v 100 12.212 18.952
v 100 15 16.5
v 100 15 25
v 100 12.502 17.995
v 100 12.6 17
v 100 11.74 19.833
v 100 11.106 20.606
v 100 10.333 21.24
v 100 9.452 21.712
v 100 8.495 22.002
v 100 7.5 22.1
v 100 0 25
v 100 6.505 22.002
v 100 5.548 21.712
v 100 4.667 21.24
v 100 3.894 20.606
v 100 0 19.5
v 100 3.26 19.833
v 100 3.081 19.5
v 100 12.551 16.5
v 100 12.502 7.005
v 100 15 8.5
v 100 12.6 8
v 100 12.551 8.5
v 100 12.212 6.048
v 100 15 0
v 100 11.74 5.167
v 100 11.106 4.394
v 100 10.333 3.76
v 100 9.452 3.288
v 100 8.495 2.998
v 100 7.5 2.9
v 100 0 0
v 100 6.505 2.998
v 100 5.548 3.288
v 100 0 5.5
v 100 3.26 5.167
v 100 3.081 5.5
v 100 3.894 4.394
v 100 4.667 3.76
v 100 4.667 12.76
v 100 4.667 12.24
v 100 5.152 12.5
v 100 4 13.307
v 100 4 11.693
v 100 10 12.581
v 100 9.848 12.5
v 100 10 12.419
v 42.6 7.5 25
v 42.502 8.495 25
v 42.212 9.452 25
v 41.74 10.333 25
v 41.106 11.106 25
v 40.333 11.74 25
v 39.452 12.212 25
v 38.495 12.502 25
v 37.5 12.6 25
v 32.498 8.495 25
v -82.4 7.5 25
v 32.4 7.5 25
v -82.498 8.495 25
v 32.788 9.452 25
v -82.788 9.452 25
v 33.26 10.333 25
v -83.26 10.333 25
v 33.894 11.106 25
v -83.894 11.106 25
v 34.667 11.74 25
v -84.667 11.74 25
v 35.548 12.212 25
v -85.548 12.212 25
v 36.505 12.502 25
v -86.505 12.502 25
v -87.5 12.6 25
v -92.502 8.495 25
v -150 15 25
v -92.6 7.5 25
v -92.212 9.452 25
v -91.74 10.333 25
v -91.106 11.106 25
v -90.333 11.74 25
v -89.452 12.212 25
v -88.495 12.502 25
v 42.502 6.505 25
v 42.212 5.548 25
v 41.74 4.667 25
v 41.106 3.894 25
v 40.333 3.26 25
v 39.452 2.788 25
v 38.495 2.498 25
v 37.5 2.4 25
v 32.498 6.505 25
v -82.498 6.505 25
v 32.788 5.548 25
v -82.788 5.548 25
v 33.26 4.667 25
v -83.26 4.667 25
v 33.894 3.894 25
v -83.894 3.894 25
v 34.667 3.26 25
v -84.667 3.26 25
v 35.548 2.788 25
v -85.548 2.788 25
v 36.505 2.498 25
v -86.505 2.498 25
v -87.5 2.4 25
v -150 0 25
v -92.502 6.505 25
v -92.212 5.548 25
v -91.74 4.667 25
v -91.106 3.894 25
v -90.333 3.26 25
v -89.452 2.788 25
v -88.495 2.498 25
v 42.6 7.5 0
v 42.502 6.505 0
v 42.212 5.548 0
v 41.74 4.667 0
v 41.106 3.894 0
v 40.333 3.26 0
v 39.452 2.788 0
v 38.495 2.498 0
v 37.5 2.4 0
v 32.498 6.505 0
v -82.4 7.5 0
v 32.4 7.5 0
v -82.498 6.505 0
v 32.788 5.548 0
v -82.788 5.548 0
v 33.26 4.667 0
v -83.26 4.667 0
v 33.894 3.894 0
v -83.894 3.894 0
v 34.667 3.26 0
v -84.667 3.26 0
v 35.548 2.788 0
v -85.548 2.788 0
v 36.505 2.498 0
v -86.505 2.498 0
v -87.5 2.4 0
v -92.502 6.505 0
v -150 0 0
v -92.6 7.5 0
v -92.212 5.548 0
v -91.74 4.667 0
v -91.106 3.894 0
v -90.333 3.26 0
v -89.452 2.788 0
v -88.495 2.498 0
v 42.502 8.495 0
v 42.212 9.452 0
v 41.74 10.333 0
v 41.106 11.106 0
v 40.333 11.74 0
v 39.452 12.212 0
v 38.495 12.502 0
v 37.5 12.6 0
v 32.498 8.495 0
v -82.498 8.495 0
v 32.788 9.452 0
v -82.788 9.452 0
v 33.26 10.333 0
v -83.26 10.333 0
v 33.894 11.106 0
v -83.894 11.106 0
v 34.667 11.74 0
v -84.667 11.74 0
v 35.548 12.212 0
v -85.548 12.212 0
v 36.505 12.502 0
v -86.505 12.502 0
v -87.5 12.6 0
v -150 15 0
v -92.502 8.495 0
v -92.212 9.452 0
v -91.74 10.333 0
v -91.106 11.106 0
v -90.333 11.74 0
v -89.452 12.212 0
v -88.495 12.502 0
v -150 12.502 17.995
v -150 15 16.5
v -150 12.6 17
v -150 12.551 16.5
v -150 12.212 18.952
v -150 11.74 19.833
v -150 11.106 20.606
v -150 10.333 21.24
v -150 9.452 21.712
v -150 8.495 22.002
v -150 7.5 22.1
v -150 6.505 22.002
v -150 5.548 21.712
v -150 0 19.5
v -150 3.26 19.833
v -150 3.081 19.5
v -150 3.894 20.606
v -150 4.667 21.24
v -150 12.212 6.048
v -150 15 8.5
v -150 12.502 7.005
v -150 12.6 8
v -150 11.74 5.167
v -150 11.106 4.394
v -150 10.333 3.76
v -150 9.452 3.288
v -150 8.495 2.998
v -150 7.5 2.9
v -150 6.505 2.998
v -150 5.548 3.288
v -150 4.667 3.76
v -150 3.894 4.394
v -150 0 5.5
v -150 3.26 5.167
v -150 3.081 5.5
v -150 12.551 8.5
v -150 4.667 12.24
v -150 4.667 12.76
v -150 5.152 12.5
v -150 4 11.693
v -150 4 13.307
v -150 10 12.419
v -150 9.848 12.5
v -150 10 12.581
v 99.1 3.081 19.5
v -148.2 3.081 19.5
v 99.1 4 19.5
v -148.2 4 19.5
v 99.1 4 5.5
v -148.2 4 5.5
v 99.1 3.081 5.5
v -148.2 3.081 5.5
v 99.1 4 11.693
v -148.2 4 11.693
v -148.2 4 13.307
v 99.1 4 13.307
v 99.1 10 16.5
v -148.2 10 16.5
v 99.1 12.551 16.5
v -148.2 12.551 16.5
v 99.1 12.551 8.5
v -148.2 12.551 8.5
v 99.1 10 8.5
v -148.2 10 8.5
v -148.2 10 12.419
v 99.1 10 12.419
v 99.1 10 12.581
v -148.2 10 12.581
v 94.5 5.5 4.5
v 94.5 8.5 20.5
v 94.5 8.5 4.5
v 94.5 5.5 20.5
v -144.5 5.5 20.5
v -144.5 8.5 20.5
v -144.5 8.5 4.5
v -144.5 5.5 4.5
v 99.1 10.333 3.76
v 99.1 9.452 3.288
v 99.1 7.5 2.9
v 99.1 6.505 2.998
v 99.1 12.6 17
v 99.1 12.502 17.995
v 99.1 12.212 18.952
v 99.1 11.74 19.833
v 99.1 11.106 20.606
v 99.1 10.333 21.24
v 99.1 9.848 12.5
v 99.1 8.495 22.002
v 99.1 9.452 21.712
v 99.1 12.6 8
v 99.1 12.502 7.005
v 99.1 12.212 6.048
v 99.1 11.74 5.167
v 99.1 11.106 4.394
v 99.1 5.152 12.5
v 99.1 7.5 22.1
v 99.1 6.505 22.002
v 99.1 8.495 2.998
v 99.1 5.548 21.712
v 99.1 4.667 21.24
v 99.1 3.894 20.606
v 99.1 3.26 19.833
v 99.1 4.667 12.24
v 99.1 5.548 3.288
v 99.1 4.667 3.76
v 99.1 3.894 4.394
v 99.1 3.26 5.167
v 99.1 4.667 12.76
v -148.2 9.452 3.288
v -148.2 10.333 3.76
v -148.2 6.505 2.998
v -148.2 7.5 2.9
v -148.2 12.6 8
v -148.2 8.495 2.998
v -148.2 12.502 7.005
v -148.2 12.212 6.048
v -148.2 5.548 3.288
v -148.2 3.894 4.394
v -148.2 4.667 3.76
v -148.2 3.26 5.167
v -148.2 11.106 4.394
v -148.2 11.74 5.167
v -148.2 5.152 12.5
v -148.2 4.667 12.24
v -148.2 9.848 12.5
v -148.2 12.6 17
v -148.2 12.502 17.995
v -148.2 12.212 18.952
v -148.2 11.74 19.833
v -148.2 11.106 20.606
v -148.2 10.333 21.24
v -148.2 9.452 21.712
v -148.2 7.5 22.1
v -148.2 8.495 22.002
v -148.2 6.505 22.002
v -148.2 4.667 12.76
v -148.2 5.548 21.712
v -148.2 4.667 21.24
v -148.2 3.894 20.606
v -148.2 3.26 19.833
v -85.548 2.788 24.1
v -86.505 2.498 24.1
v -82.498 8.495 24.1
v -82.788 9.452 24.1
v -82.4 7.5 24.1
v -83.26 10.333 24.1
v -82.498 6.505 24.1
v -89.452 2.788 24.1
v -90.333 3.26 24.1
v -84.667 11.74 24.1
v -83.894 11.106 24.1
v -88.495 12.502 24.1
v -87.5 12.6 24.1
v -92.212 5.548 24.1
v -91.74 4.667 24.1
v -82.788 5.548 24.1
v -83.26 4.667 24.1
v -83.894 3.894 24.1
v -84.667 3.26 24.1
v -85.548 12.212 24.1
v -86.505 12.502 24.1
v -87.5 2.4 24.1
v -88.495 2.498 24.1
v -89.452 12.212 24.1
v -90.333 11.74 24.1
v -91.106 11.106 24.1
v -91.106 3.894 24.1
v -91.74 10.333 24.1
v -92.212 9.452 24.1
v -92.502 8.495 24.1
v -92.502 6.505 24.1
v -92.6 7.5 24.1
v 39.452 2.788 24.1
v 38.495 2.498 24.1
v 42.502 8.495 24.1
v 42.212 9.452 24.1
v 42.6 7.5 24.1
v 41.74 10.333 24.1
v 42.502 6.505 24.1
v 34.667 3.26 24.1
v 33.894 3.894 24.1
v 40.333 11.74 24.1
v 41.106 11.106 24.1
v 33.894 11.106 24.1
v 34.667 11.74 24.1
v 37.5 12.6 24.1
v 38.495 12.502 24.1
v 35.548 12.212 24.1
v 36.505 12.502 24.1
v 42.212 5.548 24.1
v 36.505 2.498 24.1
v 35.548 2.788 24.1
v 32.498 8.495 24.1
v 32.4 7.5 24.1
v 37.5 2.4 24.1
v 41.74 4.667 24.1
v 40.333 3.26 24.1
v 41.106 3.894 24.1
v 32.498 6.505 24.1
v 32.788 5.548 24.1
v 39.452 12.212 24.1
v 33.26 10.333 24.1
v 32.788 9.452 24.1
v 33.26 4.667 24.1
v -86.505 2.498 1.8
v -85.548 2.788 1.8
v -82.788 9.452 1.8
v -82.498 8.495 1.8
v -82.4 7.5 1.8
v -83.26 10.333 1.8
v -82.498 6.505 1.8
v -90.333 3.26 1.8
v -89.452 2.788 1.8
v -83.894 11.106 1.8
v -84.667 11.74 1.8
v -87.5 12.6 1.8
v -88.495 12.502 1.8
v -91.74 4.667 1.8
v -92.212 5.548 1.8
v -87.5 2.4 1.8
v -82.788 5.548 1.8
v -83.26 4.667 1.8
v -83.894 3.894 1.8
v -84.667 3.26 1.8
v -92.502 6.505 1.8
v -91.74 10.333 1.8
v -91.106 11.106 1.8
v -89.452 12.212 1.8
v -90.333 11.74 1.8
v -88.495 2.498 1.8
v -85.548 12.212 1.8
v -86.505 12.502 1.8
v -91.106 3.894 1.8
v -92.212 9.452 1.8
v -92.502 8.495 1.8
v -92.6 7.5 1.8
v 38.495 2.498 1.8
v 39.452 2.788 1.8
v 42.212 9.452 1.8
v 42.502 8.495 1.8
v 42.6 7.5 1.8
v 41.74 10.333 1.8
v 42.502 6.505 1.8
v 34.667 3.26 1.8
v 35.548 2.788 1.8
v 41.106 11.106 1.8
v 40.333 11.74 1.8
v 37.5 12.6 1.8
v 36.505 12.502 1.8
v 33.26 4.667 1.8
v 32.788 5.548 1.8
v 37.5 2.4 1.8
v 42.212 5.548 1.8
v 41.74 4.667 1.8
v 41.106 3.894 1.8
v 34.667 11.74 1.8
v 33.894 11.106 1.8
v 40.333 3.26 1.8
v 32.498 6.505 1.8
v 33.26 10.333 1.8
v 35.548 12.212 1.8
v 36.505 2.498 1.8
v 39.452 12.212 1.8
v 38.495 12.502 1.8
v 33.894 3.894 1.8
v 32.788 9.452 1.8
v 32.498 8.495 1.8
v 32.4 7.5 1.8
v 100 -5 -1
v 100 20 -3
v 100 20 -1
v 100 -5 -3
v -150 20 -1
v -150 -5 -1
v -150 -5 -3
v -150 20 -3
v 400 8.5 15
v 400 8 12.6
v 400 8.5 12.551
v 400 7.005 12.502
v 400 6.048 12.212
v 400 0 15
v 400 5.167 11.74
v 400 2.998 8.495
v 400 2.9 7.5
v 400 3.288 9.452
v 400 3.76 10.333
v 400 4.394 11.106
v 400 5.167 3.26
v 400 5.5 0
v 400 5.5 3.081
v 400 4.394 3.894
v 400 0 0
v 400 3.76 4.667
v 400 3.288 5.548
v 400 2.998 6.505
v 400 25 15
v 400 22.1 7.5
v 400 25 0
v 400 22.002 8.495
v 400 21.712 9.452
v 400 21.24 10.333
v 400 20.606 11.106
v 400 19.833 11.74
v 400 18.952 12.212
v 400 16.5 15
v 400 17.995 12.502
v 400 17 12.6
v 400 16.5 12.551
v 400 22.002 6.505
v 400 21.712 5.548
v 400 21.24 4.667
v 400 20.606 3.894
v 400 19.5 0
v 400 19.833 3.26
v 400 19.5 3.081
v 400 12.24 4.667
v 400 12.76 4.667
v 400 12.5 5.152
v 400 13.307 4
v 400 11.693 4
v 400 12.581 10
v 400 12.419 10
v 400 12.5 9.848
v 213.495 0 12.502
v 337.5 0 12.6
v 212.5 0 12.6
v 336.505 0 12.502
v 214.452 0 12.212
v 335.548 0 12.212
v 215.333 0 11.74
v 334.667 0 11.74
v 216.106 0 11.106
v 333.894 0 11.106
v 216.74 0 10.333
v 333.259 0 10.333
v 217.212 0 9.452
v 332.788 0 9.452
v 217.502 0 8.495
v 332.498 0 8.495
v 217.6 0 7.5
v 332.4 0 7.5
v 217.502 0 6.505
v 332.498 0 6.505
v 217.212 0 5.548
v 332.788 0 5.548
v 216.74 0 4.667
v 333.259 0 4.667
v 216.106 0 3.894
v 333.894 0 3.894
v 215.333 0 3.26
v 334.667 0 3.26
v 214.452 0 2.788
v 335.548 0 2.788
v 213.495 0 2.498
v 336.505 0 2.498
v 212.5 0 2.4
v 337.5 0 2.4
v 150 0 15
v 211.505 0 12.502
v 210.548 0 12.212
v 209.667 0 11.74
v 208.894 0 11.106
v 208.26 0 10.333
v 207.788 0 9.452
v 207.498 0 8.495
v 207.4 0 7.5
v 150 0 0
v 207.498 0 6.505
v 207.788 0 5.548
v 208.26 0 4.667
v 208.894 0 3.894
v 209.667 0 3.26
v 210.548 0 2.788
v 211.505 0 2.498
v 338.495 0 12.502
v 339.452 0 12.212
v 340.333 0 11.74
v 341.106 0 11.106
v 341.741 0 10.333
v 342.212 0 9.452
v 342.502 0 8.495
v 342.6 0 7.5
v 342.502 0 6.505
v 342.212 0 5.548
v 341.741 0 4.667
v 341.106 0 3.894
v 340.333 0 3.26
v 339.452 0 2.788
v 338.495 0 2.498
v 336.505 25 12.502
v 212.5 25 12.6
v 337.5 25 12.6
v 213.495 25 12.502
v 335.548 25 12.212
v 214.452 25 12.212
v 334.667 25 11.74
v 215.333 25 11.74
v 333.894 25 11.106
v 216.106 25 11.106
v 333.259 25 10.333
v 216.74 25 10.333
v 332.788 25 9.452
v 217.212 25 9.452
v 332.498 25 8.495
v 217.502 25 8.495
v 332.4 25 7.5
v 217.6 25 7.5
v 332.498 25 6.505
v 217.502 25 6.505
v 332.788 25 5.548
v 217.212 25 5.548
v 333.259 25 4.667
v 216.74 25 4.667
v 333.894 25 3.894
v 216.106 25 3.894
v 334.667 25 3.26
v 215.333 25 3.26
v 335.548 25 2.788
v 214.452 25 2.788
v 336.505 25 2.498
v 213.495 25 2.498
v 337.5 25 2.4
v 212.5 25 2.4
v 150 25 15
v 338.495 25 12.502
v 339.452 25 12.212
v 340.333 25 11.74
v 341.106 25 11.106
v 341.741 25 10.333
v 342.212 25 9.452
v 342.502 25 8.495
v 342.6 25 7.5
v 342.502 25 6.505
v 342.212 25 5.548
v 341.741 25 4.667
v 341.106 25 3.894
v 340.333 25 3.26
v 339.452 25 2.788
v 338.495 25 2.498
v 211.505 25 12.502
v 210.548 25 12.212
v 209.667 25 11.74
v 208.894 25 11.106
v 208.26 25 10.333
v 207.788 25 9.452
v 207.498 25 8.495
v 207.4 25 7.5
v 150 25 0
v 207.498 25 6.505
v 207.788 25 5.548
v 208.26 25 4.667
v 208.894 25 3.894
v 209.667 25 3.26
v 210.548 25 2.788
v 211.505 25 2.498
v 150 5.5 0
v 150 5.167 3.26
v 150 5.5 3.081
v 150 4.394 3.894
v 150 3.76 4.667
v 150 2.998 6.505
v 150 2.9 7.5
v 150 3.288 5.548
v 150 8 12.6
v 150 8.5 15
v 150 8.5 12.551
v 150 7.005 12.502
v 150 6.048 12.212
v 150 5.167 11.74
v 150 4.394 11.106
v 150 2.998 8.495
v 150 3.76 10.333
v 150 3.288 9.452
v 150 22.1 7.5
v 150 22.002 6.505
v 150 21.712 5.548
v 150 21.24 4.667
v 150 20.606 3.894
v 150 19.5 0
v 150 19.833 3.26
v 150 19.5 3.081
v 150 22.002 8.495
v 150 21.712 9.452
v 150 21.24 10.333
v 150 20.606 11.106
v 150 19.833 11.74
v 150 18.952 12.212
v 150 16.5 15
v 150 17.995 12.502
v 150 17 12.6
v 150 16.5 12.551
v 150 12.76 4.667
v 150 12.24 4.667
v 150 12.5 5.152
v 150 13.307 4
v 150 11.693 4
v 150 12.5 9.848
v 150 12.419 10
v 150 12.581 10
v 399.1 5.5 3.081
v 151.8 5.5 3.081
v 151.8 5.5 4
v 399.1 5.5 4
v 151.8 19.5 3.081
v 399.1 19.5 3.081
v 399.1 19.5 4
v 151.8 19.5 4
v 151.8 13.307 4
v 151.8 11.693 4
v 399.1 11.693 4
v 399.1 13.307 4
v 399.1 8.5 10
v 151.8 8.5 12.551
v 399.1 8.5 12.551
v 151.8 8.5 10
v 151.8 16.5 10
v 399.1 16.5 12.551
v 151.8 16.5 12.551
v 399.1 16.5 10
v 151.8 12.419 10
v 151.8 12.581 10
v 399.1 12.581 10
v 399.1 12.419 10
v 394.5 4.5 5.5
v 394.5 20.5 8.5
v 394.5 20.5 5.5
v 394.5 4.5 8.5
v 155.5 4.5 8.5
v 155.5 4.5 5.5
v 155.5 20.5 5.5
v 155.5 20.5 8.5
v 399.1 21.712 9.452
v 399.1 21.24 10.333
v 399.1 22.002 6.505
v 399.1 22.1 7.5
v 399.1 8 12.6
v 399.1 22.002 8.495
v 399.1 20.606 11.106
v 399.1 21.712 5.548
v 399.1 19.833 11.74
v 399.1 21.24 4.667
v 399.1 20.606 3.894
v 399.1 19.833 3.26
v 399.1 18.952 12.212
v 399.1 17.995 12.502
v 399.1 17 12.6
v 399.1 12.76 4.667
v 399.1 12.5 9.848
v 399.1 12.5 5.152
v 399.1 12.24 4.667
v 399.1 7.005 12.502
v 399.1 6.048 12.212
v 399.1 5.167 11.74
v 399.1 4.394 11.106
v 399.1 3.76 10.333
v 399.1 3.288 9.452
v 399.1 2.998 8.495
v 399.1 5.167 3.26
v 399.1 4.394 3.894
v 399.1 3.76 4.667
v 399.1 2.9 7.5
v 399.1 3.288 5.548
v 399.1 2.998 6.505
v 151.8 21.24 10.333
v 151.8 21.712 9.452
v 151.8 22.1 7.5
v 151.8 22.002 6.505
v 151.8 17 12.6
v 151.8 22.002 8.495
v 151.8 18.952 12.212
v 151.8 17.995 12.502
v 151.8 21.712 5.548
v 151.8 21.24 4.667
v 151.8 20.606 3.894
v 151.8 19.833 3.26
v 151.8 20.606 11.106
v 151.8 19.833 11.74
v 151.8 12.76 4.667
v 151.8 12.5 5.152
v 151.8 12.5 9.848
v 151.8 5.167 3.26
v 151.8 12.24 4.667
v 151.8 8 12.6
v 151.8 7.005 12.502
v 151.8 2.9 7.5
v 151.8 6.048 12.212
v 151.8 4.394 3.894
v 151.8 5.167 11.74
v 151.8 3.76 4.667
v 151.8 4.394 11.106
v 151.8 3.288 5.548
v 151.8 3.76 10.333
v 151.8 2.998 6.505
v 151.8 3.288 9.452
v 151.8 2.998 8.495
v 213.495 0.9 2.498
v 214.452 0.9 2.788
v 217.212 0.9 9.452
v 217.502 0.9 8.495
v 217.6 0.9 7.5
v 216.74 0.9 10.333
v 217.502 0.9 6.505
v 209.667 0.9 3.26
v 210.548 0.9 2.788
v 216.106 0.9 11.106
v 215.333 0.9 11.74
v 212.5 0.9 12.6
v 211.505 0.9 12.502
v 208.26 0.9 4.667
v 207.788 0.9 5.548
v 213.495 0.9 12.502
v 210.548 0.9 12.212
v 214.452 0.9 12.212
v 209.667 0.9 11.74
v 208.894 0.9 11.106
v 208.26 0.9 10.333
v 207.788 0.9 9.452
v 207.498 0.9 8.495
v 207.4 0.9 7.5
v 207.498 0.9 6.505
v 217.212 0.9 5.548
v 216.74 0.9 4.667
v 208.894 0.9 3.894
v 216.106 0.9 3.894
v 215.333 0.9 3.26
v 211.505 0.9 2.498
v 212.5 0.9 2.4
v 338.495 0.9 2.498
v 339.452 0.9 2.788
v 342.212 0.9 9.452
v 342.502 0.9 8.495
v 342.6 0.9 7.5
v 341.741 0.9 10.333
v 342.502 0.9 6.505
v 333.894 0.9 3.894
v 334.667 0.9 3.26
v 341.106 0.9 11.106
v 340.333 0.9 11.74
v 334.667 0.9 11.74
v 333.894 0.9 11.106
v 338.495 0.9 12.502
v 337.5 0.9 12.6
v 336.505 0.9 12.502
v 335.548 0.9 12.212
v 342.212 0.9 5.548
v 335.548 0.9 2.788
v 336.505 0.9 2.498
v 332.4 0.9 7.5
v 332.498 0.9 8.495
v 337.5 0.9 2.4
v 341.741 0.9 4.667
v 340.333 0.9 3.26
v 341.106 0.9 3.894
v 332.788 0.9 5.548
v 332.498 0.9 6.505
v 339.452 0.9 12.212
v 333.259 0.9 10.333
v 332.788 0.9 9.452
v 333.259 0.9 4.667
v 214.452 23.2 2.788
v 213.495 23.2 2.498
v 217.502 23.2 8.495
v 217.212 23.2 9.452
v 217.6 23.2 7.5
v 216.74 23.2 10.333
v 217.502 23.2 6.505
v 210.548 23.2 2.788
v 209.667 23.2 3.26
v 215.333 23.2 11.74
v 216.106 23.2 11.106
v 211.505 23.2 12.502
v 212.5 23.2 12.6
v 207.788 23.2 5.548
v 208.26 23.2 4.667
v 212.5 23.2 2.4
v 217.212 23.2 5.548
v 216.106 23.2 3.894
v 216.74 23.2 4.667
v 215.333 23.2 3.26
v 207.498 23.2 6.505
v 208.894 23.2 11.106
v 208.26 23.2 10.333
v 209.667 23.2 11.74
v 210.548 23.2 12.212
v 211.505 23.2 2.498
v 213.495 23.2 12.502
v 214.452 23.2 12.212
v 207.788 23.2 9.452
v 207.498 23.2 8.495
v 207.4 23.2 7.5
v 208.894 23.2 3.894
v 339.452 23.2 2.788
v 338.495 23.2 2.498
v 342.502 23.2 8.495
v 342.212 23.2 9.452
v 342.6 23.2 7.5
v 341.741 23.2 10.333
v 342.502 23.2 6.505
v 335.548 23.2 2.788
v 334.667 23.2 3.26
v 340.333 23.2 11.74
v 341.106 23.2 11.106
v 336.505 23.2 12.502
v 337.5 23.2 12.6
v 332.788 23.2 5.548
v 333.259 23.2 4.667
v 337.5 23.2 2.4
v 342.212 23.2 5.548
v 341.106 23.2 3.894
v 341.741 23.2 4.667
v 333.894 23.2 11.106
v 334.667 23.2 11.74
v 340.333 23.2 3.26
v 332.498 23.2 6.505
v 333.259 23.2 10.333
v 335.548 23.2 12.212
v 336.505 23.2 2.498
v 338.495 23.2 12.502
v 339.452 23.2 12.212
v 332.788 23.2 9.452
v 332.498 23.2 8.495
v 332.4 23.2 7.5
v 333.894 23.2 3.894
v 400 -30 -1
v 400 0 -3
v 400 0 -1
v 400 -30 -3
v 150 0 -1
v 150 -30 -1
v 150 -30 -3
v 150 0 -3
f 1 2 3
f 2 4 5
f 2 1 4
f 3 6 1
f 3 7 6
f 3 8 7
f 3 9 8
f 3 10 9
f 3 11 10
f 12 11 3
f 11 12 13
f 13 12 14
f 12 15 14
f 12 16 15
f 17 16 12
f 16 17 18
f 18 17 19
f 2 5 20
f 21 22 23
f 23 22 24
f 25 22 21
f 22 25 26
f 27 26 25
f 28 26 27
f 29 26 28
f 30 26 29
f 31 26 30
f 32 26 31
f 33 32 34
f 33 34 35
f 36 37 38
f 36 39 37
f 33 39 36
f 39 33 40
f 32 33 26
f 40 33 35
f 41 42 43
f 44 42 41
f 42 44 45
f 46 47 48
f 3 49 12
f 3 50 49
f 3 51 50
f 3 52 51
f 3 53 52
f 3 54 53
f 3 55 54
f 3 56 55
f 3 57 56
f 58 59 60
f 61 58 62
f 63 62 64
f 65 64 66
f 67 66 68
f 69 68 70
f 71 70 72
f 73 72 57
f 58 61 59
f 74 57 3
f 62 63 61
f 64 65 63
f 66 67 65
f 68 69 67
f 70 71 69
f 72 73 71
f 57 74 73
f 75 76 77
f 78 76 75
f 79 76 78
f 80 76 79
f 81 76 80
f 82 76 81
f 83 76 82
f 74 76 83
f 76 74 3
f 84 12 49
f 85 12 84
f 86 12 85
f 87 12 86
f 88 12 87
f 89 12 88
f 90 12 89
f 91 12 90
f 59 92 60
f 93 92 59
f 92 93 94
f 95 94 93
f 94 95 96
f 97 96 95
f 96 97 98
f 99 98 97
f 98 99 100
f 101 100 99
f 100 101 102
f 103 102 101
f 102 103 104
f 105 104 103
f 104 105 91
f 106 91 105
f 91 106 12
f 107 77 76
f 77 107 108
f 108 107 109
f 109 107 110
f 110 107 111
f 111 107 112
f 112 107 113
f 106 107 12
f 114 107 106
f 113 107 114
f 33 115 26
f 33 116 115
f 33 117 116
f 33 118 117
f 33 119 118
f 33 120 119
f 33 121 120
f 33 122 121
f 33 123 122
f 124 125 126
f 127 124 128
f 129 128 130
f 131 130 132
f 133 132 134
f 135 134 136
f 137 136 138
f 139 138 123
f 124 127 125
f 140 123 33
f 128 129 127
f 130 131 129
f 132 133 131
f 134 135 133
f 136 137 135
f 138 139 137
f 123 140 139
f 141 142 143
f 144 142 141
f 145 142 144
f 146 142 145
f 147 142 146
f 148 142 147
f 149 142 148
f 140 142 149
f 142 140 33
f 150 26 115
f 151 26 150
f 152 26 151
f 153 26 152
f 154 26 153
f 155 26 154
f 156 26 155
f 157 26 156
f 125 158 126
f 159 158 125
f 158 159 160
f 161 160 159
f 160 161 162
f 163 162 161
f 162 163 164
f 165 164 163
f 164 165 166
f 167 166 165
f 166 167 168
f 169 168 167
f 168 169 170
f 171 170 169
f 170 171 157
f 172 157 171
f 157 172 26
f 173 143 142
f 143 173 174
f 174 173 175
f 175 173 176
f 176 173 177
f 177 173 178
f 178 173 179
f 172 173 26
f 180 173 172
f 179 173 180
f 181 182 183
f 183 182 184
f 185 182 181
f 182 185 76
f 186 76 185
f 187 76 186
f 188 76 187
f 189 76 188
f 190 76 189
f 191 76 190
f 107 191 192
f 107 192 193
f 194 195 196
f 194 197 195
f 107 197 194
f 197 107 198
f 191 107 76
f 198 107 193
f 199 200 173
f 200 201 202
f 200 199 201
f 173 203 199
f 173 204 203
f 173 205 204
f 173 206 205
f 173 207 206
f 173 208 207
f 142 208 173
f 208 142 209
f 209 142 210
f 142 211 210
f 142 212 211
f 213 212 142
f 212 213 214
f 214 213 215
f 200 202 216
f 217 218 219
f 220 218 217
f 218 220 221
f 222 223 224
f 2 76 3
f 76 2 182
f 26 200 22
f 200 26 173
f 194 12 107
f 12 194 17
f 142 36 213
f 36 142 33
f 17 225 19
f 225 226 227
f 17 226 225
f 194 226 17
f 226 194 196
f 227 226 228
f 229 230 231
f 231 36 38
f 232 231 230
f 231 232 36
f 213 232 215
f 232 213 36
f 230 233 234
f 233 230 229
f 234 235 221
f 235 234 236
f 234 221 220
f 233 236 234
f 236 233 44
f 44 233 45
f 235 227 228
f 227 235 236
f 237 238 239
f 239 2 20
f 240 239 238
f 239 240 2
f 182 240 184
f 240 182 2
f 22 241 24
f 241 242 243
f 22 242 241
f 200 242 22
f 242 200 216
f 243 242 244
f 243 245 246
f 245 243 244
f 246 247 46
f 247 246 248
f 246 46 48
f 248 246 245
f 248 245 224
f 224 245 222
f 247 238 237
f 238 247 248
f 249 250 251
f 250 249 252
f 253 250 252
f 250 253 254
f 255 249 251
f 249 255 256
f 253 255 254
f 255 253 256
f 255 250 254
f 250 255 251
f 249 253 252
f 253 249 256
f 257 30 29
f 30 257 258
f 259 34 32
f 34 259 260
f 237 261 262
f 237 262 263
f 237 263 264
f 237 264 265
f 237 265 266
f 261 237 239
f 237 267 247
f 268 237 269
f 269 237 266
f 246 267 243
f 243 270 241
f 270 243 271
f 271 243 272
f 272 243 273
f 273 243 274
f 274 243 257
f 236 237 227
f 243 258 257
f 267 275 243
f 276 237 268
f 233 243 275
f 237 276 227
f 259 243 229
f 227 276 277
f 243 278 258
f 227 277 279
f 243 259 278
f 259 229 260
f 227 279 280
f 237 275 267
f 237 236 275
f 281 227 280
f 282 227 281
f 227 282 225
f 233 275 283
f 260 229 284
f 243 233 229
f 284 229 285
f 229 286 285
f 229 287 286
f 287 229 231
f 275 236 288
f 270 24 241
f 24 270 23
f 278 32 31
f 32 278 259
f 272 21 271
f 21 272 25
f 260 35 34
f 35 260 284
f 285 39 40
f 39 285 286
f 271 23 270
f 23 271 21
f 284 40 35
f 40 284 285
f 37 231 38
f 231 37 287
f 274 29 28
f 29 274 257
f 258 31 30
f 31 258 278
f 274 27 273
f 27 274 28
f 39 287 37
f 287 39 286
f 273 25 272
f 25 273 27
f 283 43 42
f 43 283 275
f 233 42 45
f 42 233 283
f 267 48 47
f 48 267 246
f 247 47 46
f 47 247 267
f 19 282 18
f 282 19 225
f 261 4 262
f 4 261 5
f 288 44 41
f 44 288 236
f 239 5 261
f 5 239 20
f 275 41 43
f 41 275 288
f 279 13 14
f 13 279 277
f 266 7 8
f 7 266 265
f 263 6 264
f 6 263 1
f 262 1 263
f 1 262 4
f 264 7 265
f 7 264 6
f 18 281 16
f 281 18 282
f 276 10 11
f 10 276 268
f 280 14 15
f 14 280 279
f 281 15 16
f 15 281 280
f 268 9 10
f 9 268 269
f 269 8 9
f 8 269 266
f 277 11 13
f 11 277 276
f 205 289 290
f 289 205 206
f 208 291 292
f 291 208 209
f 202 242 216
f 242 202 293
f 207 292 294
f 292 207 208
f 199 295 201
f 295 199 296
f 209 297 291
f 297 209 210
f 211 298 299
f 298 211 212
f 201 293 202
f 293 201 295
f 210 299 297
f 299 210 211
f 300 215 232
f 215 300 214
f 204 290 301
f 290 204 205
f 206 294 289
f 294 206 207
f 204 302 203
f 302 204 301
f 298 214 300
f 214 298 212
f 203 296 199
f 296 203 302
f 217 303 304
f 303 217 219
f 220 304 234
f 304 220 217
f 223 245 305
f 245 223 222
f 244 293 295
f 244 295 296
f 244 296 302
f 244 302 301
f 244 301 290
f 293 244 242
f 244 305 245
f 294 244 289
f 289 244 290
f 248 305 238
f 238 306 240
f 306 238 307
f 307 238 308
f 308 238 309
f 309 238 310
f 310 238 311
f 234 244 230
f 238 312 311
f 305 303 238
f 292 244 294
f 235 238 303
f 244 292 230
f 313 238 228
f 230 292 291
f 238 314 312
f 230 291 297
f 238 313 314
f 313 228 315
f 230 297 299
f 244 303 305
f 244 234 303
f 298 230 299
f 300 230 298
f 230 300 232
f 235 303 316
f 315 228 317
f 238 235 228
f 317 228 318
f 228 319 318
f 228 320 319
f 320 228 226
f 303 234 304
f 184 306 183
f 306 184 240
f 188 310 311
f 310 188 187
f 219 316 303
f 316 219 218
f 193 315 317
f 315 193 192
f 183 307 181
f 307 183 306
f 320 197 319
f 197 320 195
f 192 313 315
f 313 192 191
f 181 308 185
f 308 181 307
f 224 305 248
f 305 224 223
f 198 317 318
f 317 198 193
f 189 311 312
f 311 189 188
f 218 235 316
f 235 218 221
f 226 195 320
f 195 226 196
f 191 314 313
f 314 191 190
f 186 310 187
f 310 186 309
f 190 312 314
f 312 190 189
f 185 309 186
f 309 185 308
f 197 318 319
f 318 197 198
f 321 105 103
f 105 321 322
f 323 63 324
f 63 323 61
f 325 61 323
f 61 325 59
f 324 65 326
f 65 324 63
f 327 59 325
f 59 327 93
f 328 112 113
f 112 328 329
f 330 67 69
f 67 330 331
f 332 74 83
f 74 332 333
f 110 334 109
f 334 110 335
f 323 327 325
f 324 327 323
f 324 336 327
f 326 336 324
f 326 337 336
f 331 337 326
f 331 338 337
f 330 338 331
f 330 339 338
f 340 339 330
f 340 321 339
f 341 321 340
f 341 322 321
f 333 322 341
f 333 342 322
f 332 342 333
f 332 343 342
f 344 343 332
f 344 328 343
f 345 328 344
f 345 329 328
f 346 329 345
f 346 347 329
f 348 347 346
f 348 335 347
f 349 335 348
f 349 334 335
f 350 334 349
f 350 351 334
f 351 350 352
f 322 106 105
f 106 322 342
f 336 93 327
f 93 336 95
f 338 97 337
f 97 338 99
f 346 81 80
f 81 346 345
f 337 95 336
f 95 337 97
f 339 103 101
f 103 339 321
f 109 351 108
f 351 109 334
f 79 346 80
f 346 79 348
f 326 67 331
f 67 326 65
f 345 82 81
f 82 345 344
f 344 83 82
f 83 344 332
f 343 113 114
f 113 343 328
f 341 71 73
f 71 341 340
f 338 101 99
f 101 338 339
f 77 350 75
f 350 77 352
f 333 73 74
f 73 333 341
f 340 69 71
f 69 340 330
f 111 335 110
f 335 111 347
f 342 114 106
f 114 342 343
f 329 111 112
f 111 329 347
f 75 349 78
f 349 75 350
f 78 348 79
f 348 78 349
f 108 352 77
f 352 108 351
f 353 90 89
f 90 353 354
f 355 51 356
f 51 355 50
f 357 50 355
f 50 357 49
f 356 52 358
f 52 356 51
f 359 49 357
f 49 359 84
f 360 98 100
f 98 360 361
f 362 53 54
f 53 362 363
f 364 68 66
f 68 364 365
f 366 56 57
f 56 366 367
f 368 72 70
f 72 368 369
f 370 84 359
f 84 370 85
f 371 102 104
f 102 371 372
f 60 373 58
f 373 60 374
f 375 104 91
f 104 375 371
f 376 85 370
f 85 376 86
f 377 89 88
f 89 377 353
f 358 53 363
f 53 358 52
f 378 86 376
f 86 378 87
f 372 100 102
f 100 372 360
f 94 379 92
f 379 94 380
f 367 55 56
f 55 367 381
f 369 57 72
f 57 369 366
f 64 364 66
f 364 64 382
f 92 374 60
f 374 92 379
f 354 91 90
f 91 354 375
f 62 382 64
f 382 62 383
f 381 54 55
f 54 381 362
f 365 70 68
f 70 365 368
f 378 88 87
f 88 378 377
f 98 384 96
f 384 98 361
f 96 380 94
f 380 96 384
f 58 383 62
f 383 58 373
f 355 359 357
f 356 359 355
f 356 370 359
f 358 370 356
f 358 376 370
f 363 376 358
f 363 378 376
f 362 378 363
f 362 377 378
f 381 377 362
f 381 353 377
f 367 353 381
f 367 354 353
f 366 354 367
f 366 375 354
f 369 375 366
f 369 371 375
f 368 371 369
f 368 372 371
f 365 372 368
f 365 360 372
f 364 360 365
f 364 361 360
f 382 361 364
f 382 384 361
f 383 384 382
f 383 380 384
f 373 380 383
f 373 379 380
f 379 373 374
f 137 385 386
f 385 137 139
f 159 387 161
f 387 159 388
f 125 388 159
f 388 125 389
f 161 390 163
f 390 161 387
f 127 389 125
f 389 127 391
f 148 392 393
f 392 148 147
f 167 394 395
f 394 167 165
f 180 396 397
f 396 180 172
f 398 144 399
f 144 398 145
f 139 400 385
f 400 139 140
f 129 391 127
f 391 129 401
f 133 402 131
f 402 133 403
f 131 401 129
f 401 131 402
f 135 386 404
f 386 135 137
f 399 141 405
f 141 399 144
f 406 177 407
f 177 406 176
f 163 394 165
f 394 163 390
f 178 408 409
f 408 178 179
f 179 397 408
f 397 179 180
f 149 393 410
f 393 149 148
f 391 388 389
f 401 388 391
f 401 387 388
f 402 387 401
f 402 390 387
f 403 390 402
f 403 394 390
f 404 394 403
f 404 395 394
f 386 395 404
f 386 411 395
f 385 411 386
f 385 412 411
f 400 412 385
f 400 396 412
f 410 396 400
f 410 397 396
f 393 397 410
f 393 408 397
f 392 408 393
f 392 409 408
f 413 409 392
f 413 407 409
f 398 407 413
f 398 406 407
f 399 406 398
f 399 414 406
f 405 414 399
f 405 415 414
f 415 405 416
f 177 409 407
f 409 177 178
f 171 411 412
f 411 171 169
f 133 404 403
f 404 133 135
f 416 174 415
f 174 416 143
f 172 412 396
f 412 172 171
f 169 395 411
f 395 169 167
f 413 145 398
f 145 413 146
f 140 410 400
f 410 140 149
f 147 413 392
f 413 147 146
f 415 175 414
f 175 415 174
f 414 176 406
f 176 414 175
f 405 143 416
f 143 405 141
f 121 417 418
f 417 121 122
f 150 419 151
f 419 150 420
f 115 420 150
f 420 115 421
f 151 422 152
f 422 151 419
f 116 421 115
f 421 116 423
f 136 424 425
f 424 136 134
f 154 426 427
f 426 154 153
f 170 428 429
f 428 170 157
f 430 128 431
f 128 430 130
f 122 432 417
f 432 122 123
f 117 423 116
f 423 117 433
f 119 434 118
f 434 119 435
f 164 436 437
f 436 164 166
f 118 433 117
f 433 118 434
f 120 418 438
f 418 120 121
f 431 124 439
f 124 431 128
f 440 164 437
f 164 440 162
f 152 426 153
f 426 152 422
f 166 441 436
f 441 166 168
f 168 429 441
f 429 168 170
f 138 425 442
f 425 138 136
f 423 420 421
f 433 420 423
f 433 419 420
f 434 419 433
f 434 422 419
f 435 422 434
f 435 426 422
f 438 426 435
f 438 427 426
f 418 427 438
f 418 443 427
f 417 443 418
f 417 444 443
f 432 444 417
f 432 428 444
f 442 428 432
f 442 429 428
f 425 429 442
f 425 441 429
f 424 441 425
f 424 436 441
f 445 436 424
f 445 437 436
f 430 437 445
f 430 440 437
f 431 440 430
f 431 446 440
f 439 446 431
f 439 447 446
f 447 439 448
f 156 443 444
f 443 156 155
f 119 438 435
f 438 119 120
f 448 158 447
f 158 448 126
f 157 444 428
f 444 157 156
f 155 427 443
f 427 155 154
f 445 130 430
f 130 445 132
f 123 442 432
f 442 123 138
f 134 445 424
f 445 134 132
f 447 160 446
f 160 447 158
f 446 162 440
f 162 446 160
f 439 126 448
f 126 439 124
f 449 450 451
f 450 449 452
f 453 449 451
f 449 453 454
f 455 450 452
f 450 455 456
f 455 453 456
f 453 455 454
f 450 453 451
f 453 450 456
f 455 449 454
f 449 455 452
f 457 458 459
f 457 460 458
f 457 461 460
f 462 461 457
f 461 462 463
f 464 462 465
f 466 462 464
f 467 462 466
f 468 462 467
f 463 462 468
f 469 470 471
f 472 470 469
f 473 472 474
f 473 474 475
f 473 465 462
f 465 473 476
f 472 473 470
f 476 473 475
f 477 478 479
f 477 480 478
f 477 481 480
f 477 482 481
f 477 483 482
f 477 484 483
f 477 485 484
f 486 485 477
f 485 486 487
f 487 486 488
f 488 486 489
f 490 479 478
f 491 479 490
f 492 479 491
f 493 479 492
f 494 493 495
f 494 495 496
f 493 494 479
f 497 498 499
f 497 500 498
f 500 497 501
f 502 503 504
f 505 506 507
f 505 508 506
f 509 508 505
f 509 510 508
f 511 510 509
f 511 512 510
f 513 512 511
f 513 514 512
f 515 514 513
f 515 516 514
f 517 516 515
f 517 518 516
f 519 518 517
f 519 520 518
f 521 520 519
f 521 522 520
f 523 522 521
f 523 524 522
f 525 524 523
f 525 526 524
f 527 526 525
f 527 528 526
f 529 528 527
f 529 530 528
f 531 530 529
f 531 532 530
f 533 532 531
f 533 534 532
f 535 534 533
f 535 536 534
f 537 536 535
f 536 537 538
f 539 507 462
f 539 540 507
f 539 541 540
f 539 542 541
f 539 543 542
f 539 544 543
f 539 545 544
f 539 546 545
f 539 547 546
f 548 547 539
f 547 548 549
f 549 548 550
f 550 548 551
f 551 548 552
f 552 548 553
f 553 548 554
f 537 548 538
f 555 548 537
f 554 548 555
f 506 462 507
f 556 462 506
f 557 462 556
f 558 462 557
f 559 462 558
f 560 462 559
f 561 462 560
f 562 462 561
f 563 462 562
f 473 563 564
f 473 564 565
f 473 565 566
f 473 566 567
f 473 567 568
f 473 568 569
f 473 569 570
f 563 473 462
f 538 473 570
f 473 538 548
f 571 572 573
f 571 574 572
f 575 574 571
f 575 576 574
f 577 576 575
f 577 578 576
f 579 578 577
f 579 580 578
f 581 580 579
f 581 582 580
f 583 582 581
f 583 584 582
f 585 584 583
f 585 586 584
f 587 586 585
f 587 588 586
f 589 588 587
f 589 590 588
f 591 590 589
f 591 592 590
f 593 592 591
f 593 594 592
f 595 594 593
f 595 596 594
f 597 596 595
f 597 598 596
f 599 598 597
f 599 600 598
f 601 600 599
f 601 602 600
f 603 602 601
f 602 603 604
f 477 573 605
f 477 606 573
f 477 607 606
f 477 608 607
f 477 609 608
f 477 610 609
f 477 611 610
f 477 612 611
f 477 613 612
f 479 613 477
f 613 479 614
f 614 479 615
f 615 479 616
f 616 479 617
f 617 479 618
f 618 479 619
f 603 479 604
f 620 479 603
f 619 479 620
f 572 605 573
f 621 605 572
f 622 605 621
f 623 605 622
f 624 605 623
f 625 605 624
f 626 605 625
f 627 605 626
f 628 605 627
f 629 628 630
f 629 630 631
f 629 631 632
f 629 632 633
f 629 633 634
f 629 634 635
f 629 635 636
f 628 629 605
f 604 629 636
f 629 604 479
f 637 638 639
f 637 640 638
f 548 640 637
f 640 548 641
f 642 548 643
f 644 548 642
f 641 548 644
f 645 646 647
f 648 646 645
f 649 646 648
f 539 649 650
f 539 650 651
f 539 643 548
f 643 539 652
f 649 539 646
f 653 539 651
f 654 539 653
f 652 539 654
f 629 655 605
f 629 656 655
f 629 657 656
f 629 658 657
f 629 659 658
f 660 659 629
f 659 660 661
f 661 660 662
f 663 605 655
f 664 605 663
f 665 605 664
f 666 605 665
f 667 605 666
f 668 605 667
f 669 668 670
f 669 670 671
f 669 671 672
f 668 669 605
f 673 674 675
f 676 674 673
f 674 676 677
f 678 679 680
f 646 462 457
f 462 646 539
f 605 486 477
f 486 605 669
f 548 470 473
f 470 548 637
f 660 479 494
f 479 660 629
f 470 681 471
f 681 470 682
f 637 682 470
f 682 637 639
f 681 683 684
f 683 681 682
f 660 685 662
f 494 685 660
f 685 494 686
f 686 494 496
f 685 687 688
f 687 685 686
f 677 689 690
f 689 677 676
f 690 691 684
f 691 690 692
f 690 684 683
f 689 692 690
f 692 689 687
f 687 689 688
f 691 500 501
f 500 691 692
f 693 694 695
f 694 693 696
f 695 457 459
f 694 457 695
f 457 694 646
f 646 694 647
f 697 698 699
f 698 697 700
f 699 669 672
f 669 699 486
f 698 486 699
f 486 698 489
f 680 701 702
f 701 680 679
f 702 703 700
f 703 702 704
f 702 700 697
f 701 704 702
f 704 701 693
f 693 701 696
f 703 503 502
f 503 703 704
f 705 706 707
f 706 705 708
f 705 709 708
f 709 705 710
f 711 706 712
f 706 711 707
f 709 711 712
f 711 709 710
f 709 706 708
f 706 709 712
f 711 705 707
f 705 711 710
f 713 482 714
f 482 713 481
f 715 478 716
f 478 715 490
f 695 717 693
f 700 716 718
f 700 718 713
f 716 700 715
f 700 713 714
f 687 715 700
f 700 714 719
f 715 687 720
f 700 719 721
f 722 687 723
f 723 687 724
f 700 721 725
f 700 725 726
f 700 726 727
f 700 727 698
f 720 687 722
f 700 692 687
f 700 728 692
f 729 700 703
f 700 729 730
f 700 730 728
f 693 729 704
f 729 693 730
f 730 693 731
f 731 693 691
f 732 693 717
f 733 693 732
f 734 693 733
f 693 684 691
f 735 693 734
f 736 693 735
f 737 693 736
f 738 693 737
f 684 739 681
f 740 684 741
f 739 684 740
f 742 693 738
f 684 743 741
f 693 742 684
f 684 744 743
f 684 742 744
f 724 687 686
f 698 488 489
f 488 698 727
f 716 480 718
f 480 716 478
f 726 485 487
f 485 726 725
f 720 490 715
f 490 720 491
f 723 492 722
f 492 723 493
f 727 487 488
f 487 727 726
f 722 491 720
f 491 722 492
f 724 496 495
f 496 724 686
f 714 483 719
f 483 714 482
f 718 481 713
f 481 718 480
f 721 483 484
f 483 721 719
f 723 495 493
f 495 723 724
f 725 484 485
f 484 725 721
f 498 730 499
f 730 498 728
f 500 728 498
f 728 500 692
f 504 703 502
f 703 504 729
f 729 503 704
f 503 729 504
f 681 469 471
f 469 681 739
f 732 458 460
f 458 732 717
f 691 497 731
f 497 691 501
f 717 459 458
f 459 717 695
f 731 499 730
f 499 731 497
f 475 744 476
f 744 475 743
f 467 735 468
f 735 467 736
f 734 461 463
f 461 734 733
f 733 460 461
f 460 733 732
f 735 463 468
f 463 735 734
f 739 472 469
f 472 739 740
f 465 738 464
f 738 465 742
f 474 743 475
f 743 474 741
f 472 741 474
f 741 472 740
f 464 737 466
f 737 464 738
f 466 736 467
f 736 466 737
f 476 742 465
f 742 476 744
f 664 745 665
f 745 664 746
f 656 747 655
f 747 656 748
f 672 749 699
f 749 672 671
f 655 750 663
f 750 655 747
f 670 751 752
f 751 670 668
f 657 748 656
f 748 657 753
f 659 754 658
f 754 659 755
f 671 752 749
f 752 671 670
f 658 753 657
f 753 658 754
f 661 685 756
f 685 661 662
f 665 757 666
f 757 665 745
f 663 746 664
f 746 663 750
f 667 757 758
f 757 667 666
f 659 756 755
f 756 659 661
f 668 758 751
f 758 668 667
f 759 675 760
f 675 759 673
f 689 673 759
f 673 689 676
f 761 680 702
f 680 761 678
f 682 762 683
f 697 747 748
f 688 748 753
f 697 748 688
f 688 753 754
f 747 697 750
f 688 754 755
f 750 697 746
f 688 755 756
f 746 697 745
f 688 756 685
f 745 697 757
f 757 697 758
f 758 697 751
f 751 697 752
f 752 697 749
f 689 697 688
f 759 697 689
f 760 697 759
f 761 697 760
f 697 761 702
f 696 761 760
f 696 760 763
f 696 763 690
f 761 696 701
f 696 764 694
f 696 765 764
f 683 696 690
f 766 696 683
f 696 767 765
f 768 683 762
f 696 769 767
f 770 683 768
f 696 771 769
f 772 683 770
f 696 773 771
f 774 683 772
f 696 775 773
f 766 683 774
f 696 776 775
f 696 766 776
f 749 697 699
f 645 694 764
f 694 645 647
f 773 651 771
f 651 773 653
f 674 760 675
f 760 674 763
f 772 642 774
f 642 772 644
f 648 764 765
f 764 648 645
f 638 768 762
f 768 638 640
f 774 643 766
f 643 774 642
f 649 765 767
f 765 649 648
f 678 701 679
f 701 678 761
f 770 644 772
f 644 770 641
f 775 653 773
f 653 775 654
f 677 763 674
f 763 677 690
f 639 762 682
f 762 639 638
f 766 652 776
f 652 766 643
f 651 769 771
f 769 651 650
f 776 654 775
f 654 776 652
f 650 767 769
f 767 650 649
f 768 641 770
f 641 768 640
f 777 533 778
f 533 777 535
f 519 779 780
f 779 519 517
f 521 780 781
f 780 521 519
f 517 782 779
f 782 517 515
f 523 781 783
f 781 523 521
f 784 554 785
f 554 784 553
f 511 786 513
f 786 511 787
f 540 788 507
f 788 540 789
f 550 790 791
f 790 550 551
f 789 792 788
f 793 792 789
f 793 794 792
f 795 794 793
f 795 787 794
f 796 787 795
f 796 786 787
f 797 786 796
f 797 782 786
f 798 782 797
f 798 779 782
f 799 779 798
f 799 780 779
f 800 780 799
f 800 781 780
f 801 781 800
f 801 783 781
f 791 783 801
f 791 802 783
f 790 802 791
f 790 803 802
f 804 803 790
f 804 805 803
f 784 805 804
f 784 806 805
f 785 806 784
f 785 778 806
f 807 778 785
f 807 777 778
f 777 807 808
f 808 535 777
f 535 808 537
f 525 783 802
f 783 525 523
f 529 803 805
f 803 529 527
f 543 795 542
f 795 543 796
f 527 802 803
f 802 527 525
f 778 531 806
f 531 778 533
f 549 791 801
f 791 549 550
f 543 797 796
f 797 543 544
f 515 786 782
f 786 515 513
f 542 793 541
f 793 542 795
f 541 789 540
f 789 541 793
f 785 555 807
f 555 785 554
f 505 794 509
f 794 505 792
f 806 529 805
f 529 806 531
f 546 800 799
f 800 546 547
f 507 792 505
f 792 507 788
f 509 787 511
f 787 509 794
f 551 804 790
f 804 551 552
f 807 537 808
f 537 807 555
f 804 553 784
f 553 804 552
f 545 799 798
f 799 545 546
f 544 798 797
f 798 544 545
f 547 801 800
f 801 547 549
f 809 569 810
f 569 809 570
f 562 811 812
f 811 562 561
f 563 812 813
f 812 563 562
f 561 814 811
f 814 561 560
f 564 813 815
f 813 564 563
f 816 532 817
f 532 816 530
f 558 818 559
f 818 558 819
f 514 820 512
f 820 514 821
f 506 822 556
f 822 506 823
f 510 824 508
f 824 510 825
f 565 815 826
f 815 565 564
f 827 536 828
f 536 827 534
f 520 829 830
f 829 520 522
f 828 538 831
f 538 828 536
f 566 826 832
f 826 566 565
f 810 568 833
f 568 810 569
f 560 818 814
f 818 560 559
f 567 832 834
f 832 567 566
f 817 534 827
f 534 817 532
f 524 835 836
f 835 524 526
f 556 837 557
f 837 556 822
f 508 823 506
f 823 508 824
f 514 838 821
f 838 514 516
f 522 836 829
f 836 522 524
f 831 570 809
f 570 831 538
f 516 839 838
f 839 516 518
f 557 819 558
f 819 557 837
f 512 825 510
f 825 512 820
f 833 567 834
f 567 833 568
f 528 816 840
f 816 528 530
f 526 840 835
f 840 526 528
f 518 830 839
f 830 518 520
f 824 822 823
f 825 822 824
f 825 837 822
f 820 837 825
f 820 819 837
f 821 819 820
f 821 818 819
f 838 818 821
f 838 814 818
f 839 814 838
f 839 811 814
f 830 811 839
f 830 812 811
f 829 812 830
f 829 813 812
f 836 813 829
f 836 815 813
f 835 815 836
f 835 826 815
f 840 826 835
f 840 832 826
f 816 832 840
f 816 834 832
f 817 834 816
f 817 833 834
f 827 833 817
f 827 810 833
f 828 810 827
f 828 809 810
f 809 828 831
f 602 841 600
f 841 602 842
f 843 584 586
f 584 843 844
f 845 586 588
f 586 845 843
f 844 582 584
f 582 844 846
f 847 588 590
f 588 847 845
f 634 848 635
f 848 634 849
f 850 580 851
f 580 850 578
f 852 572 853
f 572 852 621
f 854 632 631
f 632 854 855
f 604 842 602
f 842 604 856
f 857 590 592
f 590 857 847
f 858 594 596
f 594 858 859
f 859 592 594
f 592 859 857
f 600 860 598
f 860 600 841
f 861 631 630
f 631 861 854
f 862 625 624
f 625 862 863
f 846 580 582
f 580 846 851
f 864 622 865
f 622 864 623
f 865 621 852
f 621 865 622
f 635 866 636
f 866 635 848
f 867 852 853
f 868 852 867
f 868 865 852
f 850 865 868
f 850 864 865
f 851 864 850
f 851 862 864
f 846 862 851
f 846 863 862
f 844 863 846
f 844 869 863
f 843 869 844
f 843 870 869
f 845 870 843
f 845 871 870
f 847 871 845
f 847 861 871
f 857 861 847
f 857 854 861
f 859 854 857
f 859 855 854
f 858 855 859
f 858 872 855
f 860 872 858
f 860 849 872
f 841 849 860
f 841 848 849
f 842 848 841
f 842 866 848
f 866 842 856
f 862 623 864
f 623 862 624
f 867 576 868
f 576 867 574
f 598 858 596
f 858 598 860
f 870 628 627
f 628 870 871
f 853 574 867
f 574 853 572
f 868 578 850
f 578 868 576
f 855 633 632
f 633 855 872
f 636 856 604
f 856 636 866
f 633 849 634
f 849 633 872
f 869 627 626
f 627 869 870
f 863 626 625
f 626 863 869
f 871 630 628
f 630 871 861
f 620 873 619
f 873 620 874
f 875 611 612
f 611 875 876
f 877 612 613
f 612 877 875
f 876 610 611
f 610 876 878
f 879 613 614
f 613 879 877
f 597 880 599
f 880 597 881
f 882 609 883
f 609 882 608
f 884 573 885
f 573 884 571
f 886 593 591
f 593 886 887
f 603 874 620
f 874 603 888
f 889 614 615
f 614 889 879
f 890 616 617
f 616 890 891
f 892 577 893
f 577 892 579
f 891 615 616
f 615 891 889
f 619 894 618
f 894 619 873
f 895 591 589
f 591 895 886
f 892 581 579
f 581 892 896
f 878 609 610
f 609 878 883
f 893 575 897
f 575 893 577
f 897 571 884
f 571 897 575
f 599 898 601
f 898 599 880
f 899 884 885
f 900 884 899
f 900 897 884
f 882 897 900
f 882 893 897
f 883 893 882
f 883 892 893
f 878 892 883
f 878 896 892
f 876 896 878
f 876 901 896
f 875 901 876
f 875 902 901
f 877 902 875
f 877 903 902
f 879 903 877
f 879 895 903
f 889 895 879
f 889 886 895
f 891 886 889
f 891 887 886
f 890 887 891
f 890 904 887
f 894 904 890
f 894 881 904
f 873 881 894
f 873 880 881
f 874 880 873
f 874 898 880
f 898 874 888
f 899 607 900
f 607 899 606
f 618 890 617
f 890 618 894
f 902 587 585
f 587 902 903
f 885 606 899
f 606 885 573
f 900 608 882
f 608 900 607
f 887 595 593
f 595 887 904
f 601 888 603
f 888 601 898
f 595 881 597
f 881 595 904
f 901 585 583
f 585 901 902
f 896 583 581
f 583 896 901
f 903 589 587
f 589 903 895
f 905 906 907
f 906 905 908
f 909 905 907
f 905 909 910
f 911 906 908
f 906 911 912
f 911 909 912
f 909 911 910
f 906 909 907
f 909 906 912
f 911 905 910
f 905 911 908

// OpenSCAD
// file: single_module.scad
/*
 * Single LED Strip Module - Minimal Design
 * Compact holder for one section of WS2812B LED strip
 *
 * Features:
 * - Minimal size - just enough to hold the strip
 * - 4 magnet holes for modular connections
 * - Lightweight and movable
 */

// ========== CONFIGURATION ==========

// LED Strip dimensions
strip_segment_length = 250;  // Length of this module
strip_width = 12;            // WS2812B strip width

// Module dimensions (MINIMIZED)
module_width = strip_segment_length;
module_height = 25;          // 2.5cm vertical spacing (compact!)
module_depth = 15;           // Reduced from 20mm to 15mm
wall_thickness = 1.5;        // Reduced from 2mm to 1.5mm

// LED channel (on front)
led_channel_depth = 4;       // Shallow groove (reduced from 5mm)
led_channel_width = 14;      // Increased to 14mm for better fit

// Wire channel (on back)
wire_channel_width = 8;      // Narrow channel for wires
wire_channel_depth = 5;      // Back routing space

// Magnets (user's magnets: 10mm dia × 1.54mm thick)
magnet_dia = 10.2;           // 10mm + 0.2mm tolerance
magnet_thickness = 1.8;      // 1.54mm + tolerance (thin!)
magnet_inset = 8;            // Distance from edges (adjusted for 25mm height)

// ========== SINGLE MODULE ==========

module minimal_strip_holder() {
    difference() {
        // Main body - thin shell
        cube([module_width, module_depth, module_height]);

        // Front LED channel (OPEN ENDS - strip passes through)
        translate([-0.1, -0.1, module_height/2 - led_channel_width/2])
            cube([module_width + 0.2,  // Goes all the way through left to right
                  led_channel_depth + 0.1,
                  led_channel_width]);

        // Back wire channel (OPEN ENDS - wires pass through)
        translate([-0.1, module_depth - wire_channel_depth, module_height/2 - wire_channel_width/2])
            cube([module_width + 0.2,  // Goes all the way through left to right
                  wire_channel_depth + 0.1,
                  wire_channel_width]);

        // Center cavity (weight reduction)
        translate([wall_thickness + 4,
                  led_channel_depth + wall_thickness,
                  wall_thickness + 3])
            cube([module_width - 2*wall_thickness - 8,
                  module_depth - led_channel_depth - wire_channel_depth - 2*wall_thickness,
                  module_height - 2*wall_thickness - 6]);

        // HORIZONTAL magnets (left/right)
        // Right side
        translate([module_width - magnet_thickness/2, module_depth/2, magnet_inset])
            rotate([0, 90, 0])
            cylinder(h=magnet_thickness + 0.1, d=magnet_dia, $fn=32);
        translate([module_width - magnet_thickness/2, module_depth/2, module_height - magnet_inset])
            rotate([0, 90, 0])
            cylinder(h=magnet_thickness + 0.1, d=magnet_dia, $fn=32);

        // Left side
        translate([-0.1, module_depth/2, magnet_inset])
            rotate([0, 90, 0])
            cylinder(h=magnet_thickness + 0.1, d=magnet_dia, $fn=32);
        translate([-0.1, module_depth/2, module_height - magnet_inset])
            rotate([0, 90, 0])
            cylinder(h=magnet_thickness + 0.1, d=magnet_dia, $fn=32);

        // VERTICAL magnets (top/bottom)
        // Top
        translate([module_width/4, module_depth/2, module_height - magnet_thickness/2])
            cylinder(h=magnet_thickness + 0.1, d=magnet_dia, $fn=32);
        translate([3*module_width/4, module_depth/2, module_height - magnet_thickness/2])
            cylinder(h=magnet_thickness + 0.1, d=magnet_dia, $fn=32);

        // Bottom
        translate([module_width/4, module_depth/2, -0.1])
            cylinder(h=magnet_thickness + 0.1, d=magnet_dia, $fn=32);
        translate([3*module_width/4, module_depth/2, -0.1])
            cylinder(h=magnet_thickness + 0.1, d=magnet_dia, $fn=32);
    }
}

// LED strip visualization (optional)
module led_strip_visual() {
    color("white", 0.9)
    translate([wall_thickness, led_channel_depth - 3, module_height/2 - strip_width/2])
    rotate([90, 0, 0])
    cube([module_width - 2*wall_thickness, strip_width, 3]);

    // LEDs
    led_spacing = module_width / 36;  // 36 LEDs per module
    for (i = [0:35]) {
        color("gold", 0.8)
        translate([i * led_spacing + led_spacing/2,
                  1,
                  module_height/2])
            rotate([90, 0, 0])
            cylinder(h=2, d=4, $fn=6);
    }
}

// ========== RENDER ==========

// Show module
minimal_strip_holder();

// Show LED strip (uncomment to visualize)
// led_strip_visual();

// ========== EXPORT NOTES ==========
/*
 * DIMENSIONS:
 * - Size: 250mm (W) × 50mm (H) × 15mm (D)
 * - Weight: ~15-18g per module (at 15% infill)
 * - Wall thickness: 1.5mm
 *
 * MAGNETS:
 * - 4× 10mm × 3mm neodymium magnets per module
 * - Amazon: "neodymium magnets 10mm x 3mm N52"
 *
 * PRINTING:
 * - Layer height: 0.2mm
 * - Infill: 15%
 * - No supports needed
 * - Print time: ~1-1.5 hours per module
 *
 * CUSTOMIZATION:
 * - Adjust module_width for different lengths (e.g., 200mm, 333mm)
 * - Change module_height for different spacing (e.g., 30mm, 40mm, 60mm)
 * - Modify led_channel_width if your strip is wider/narrower
 *
 * EXPORT STL:
 * openscad -o module.stl single_module.scad
 */
// main file
use <single_module.scad>

// GOOD - Side view showing vertical magnet holes
translate([-150, 0, 0]) {
    minimal_strip_holder();
    
    // Build plate
    translate([0, -5, -3])
        color("green", 0.7)
        cube([250, 25, 2]);
        
    // Label
    translate([125, 7.5, 30])
        color("green")
        text("✓ CIRCLES", size=10, halign="center");
}

// BAD - Side view showing horizontal magnet holes
translate([150, 0, 0]) {
    rotate([90, 0, 0])
        translate([0, 0, -25])
        minimal_strip_holder();
    
    // Build plate
    translate([0, -30, -3])
        color("red", 0.7)
        cube([250, 30, 2]);
        
    // Label
    translate([125, 0, 30])
        color("red")
        text("✗ OVALS", size=10, halign="center");
}
